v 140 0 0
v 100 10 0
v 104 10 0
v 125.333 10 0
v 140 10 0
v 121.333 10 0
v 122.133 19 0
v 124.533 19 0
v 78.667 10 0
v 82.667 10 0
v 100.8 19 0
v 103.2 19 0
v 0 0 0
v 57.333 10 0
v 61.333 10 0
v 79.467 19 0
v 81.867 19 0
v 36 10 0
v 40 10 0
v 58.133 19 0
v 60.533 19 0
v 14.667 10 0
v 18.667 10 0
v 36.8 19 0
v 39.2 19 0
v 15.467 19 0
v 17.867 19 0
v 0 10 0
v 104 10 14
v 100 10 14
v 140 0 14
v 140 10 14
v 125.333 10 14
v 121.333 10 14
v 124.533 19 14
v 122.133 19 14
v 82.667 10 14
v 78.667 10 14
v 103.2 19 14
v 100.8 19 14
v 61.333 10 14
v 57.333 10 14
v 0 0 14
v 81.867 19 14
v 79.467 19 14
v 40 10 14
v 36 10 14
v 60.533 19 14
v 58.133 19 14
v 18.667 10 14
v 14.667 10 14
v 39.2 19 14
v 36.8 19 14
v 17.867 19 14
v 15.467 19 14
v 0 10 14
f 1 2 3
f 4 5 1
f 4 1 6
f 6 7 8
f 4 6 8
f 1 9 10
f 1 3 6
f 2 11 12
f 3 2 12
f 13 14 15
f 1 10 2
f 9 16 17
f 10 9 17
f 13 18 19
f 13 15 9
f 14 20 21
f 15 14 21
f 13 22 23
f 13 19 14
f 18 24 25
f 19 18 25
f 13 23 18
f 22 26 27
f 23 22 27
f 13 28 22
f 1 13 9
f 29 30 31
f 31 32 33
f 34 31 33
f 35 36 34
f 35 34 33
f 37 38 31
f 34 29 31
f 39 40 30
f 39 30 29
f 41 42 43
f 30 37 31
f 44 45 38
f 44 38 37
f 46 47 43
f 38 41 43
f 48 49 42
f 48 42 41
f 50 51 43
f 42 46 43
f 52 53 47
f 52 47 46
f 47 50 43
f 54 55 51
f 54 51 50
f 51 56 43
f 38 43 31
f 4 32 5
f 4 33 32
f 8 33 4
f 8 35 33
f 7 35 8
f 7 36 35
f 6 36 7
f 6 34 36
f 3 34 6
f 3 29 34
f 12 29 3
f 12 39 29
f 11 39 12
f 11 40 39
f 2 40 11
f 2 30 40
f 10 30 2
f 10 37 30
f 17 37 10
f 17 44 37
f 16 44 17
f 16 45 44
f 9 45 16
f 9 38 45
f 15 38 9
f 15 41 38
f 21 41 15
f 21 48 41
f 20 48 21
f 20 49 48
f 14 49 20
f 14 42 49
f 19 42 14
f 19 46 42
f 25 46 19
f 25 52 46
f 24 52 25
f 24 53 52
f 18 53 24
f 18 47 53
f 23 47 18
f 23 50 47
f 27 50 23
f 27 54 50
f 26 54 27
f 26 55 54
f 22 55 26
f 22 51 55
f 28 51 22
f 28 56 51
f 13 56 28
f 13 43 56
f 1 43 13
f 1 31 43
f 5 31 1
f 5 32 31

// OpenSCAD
$fn = 32;

// ----------------------------------------------------------------------
// Gear rack: 6 teeth on a 140 mm bar, pitch 21.33 mm
// ----------------------------------------------------------------------

// --- parameters (mm) ---
profile_height = 14;      // extrusion height
profile_points = 28;      // points of the closed outline

profile = [[0, 0], [140, 0], [140, 10], [125.333, 10], [124.533, 19], [122.133, 19], [121.333, 10], [104, 10], [103.2, 19], [100.8, 19], [100, 10], [82.667, 10], [81.867, 19], [79.467, 19], [78.667, 10], [61.333, 10], [60.533, 19], [58.133, 19], [57.333, 10], [40, 10], [39.2, 19], [36.8, 19], [36, 10], [18.667, 10], [17.867, 19], [15.467, 19], [14.667, 10], [0, 10]];  // single closed polygon, 28 points, counter clockwise

// --- the one profile operation ---
linear_extrude(height = profile_height) polygon(points = profile);
